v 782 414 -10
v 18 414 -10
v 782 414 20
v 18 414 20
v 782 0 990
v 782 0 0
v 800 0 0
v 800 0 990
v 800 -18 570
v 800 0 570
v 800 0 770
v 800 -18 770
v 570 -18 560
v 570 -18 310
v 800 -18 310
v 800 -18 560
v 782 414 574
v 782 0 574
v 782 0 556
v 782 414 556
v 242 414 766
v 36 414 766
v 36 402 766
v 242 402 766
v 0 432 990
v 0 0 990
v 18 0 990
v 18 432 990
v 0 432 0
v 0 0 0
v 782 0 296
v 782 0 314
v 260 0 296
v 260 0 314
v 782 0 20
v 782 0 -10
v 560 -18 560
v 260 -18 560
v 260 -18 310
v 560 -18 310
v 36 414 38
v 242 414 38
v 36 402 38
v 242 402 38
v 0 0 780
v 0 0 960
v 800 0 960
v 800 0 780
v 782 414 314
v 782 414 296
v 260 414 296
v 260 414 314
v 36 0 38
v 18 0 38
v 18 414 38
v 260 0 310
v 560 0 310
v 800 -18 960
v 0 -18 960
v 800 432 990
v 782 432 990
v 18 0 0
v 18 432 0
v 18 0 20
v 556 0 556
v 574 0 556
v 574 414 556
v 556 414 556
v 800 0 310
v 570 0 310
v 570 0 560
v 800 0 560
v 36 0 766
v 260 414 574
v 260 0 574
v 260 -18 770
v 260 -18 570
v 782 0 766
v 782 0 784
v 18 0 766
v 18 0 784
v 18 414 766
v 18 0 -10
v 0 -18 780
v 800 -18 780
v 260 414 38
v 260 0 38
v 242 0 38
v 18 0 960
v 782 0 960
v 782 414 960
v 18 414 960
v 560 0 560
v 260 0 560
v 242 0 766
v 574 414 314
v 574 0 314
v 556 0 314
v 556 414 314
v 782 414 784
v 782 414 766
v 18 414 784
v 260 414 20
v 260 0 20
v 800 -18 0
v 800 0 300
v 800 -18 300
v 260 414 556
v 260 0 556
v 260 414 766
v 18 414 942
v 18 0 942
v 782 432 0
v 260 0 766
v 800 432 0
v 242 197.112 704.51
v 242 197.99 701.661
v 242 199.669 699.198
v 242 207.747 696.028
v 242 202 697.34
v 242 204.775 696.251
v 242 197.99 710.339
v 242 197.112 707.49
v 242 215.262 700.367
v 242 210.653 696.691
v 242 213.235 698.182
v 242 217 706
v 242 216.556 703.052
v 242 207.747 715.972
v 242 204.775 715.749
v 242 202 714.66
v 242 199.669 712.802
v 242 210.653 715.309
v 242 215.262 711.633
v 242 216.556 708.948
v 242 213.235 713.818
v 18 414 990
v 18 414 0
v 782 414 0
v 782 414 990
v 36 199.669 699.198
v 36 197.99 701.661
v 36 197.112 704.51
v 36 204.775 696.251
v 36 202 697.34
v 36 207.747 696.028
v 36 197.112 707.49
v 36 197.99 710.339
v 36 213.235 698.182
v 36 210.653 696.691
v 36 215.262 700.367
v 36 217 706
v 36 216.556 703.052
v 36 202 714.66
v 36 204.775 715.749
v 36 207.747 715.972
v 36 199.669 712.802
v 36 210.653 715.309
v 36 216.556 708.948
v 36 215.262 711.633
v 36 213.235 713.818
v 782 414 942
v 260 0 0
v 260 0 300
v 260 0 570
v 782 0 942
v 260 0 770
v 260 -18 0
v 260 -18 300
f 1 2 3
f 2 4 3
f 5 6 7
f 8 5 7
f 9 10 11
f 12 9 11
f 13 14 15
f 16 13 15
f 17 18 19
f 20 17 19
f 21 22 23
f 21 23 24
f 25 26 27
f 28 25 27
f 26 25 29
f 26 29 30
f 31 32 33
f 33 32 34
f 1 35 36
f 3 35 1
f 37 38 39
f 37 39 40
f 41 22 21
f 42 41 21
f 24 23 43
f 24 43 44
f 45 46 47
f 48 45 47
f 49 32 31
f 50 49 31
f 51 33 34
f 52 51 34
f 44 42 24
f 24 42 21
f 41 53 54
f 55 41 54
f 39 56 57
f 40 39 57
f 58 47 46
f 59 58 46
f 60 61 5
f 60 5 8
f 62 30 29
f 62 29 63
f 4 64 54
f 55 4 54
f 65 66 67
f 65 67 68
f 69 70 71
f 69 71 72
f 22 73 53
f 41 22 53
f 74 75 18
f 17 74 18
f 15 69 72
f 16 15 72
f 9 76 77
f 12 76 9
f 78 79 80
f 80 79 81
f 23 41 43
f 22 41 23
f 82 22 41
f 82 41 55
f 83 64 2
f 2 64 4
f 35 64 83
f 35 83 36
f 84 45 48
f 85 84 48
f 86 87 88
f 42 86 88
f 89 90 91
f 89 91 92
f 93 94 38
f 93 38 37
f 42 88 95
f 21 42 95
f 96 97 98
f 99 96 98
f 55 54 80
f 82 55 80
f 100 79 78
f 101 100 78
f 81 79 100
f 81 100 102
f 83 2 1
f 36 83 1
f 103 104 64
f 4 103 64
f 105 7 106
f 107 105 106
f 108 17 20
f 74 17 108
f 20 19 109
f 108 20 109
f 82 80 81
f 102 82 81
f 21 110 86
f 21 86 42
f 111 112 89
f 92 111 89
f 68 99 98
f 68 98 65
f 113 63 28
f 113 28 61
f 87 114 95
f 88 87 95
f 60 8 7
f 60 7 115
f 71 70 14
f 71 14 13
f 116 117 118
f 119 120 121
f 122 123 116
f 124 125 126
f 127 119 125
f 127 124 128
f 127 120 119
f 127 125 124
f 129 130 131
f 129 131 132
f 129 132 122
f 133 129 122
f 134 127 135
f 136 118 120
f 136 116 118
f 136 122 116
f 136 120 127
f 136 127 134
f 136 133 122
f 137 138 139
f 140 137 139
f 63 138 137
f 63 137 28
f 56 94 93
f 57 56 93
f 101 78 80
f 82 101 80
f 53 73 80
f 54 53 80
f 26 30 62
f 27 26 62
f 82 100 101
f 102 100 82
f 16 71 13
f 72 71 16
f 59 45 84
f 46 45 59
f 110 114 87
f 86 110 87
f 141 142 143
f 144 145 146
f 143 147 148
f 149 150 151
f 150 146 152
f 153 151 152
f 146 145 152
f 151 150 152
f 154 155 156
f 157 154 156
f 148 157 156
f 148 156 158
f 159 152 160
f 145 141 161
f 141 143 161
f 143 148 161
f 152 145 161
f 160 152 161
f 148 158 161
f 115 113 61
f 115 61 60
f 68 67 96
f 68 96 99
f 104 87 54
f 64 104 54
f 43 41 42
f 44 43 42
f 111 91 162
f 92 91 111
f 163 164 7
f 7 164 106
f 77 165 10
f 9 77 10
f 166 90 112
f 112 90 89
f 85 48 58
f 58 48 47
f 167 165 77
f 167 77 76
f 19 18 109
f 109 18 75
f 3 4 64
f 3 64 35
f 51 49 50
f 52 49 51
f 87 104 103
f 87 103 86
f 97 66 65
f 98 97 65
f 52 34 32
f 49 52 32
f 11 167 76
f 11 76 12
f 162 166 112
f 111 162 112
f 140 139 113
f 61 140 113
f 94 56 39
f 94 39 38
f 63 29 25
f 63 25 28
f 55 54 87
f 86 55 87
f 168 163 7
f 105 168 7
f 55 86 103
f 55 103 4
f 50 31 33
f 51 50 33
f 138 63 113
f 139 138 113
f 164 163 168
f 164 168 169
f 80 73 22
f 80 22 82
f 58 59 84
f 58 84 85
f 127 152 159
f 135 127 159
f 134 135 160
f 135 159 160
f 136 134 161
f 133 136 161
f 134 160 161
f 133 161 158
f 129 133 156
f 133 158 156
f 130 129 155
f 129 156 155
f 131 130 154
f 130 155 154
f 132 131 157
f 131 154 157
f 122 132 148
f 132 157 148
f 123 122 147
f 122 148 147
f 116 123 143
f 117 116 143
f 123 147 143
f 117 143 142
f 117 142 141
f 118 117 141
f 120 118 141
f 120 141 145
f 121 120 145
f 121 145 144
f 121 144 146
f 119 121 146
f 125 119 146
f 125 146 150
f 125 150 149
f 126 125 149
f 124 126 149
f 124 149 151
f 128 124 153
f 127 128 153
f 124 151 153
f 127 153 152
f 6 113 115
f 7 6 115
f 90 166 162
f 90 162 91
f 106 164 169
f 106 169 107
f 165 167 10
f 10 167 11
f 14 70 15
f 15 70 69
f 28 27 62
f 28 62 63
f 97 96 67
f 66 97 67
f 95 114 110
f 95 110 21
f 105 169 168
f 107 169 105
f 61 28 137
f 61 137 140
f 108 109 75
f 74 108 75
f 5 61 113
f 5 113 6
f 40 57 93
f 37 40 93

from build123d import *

# Parameters (mm, degrees)
F0_W          = 18
F0_H          = 414
F0_H_2        = 18
F1_DEPTH      = 990
F0_W_2        = 764
F2_DEPTH      = 990
F3_DEPTH      = 20
F3_DEPTH_BACK = 10
F4_W          = 782
F4_H          = 180
F4_W_2        = 18
F5_DEPTH      = 18
F4_W_3        = 540
F4_H_2        = 200
F4_W_4        = 230
F4_H_3        = 250
F4_H_4        = 300
F4_W_5        = 300
F6_W          = 764
F6_H          = 18
F7_DEPTH      = 414
F6_H_2        = 4
F6_W_2        = 18
F6_W_3        = 206
F6_H_3        = 192
F6_H_4        = 258
F6_H_5        = 242
F8_DEPTH      = 414
F9_R          = 10
F10_DEPTH     = 206
F11_W         = 206
F11_H         = 728
F12_DEPTH     = 12


# Not quite as in the source:
# - a feature names something its author has since deleted; it is built from what else it names


with BuildPart() as f1:
    # F0 (on Top) → F1 (new body)
    with BuildSketch(Plane.XY):
        with Locations((9, 207)):
            Rectangle(F0_W, F0_H)
        with Locations((9, 423)):
            Rectangle(F0_W, F0_H_2)
    extrude(amount=F1_DEPTH)


with BuildPart() as f1b:
    # F0 (on Top) → F1, piece 2 (new body)
    with BuildSketch(Plane.XY):
        with Locations((791, 423)):
            Rectangle(F0_W, F0_H_2)
        with Locations((791, 207)):
            Rectangle(F0_W, F0_H)
    extrude(amount=F1_DEPTH)


with BuildPart() as f2:
    # F0 (on Top) → F2 (new body, through all)
    with BuildSketch(Plane.XY):
        with Locations((400, 423)):
            Rectangle(F0_W_2, F0_H_2)
    extrude(amount=F2_DEPTH)


with BuildPart() as f3:
    # F0 (on Top) → F3 (new body, two sides)
    with BuildSketch(Plane.XY) as f3_sk:
        with Locations((400, 207)):
            Rectangle(F0_W_2, F0_H)
    extrude(amount=F3_DEPTH)
    extrude(f3_sk.sketch, amount=-F3_DEPTH_BACK)


with BuildPart() as f5:
    # F4 (on face) → F5 (new body)
    with BuildSketch(Plane.XZ):
        with Locations((409, 870)):
            Rectangle(F4_W, F4_H)
        with Locations((9, 870)):
            Rectangle(F4_W_2, F4_H)
    extrude(amount=F5_DEPTH)


with BuildPart() as f5b:
    # F4 (on face) → F5, piece 2 (new body)
    with BuildSketch(Plane.XZ):
        with Locations((530, 670)):
            Rectangle(F4_W_3, F4_H_2)
    extrude(amount=F5_DEPTH)


with BuildPart() as f5c:
    # F4 (on face) → F5, piece 3 (new body)
    with BuildSketch(Plane.XZ):
        with Locations((685, 435)):
            Rectangle(F4_W_4, F4_H_3)
    extrude(amount=F5_DEPTH)


with BuildPart() as f5d:
    # F4 (on face) → F5, piece 4 (new body)
    with BuildSketch(Plane.XZ):
        with Locations((530, 150)):
            Rectangle(F4_W_3, F4_H_4)
    extrude(amount=F5_DEPTH)


with BuildPart() as f5e:
    # F4 (on face) → F5, piece 5 (new body)
    with BuildSketch(Plane.XZ):
        with Locations((410, 435)):
            Rectangle(F4_W_5, F4_H_3)
    extrude(amount=F5_DEPTH)


with BuildPart() as f7:
    # F6 (on face) → F7 (new body, through all)
    with BuildSketch(Plane(origin=(0, 0, 0), x_dir=(-1, 0, 0), z_dir=(0, 1, 0))):
        with Locations((-400, 951)):
            Rectangle(F6_W, F6_H)
    extrude(amount=F7_DEPTH)


with BuildPart() as f7b:
    # F6 (on face) → F7, piece 2 (new body, through all)
    with BuildSketch(Plane(origin=(0, 0, 0), x_dir=(-1, 0, 0), z_dir=(0, 1, 0))):
        Polygon((-18, 780), (-782, 780), (-782, 766), (-260, 766), (-242, 766), (-36, 766), (-18, 766), align=None)
        with Locations((-400, 782)):
            Rectangle(F6_W, F6_H_2)
    extrude(amount=F7_DEPTH)


with BuildPart() as f7c:
    # F6 (on face) → F7, piece 3 (new body, through all)
    with BuildSketch(Plane(origin=(0, 0, 0), x_dir=(-1, 0, 0), z_dir=(0, 1, 0))):
        Polygon((-260, 556), (-260, 574), (-782, 574), (-782, 556), (-574, 556), (-556, 556), align=None)
    extrude(amount=F7_DEPTH)


with BuildPart() as f7d:
    # F6 (on face) → F7, piece 4 (new body, through all)
    with BuildSketch(Plane(origin=(0, 0, 0), x_dir=(-1, 0, 0), z_dir=(0, 1, 0))):
        Polygon((-260, 296), (-260, 314), (-556, 314), (-574, 314), (-782, 314), (-782, 296), align=None)
    extrude(amount=F7_DEPTH)


with BuildPart() as f7e:
    # F6 (on face) → F7, piece 5 (new body, through all)
    with BuildSketch(Plane(origin=(0, 0, 0), x_dir=(-1, 0, 0), z_dir=(0, 1, 0))):
        with Locations((-251, 29)):
            Rectangle(F6_W_2, F6_H)
        with Locations((-139, 29)):
            Rectangle(F6_W_3, F6_H)
        with Locations((-27, 29)):
            Rectangle(F6_W_2, F6_H)
    extrude(amount=F7_DEPTH)


with BuildPart() as f8:
    # F6 (on face) → F8 (new body, through all)
    with BuildSketch(Plane(origin=(0, 0, 0), x_dir=(-1, 0, 0), z_dir=(0, 1, 0))):
        with Locations((-251, 670)):
            Rectangle(F6_W_2, F6_H_3)
        with Locations((-251, 167)):
            Rectangle(F6_W_2, F6_H_4)
        with Locations((-251, 305)):
            Rectangle(F6_W_2, F6_H)
        with Locations((-251, 435)):
            Rectangle(F6_W_2, F6_H_5)
        with Locations((-251, 565)):
            Rectangle(F6_W_2, F6_H)
    extrude(amount=F8_DEPTH)


with BuildPart() as f8b:
    # F6 (on face) → F8, piece 2 (new body, through all)
    with BuildSketch(Plane(origin=(0, 0, 0), x_dir=(-1, 0, 0), z_dir=(0, 1, 0))):
        with Locations((-565, 435)):
            Rectangle(F6_W_2, F6_H_5)
    extrude(amount=F8_DEPTH)


with BuildPart() as f8c:
    # F6 (on face) → F8, piece 3 (new body, through all)
    with BuildSketch(Plane(origin=(0, 0, 0), x_dir=(-1, 0, 0), z_dir=(0, 1, 0))):
        with Locations((-27, 670)):
            Rectangle(F6_W_2, F6_H_3)
        with Locations((-27, 565)):
            Rectangle(F6_W_2, F6_H)
        with Locations((-27, 435)):
            Rectangle(F6_W_2, F6_H_5)
        with Locations((-27, 305)):
            Rectangle(F6_W_2, F6_H)
        with Locations((-27, 167)):
            Rectangle(F6_W_2, F6_H_4)
    extrude(amount=F8_DEPTH)


with BuildPart() as f10:
    # F9 (on face) → F10 (new body, through all)
    with BuildSketch(Plane.YZ.offset(36)):
        with Locations((207, 706)):
            Circle(F9_R)
    extrude(amount=F10_DEPTH)


with BuildPart() as f12:
    # F11 (on face) → F12 (new body)
    with BuildSketch(Plane.XZ.offset(-414)):
        with Locations((139, 402)):
            Rectangle(F11_W, F11_H)
    extrude(amount=F12_DEPTH)


solid = Compound([f1.part, f1b.part, f2.part, f3.part, f5.part, f5b.part, f5c.part, f5d.part, f5e.part, f7.part, f7b.part, f7c.part, f7d.part, f7e.part, f8.part, f8b.part, f8c.part, f10.part, f12.part])
